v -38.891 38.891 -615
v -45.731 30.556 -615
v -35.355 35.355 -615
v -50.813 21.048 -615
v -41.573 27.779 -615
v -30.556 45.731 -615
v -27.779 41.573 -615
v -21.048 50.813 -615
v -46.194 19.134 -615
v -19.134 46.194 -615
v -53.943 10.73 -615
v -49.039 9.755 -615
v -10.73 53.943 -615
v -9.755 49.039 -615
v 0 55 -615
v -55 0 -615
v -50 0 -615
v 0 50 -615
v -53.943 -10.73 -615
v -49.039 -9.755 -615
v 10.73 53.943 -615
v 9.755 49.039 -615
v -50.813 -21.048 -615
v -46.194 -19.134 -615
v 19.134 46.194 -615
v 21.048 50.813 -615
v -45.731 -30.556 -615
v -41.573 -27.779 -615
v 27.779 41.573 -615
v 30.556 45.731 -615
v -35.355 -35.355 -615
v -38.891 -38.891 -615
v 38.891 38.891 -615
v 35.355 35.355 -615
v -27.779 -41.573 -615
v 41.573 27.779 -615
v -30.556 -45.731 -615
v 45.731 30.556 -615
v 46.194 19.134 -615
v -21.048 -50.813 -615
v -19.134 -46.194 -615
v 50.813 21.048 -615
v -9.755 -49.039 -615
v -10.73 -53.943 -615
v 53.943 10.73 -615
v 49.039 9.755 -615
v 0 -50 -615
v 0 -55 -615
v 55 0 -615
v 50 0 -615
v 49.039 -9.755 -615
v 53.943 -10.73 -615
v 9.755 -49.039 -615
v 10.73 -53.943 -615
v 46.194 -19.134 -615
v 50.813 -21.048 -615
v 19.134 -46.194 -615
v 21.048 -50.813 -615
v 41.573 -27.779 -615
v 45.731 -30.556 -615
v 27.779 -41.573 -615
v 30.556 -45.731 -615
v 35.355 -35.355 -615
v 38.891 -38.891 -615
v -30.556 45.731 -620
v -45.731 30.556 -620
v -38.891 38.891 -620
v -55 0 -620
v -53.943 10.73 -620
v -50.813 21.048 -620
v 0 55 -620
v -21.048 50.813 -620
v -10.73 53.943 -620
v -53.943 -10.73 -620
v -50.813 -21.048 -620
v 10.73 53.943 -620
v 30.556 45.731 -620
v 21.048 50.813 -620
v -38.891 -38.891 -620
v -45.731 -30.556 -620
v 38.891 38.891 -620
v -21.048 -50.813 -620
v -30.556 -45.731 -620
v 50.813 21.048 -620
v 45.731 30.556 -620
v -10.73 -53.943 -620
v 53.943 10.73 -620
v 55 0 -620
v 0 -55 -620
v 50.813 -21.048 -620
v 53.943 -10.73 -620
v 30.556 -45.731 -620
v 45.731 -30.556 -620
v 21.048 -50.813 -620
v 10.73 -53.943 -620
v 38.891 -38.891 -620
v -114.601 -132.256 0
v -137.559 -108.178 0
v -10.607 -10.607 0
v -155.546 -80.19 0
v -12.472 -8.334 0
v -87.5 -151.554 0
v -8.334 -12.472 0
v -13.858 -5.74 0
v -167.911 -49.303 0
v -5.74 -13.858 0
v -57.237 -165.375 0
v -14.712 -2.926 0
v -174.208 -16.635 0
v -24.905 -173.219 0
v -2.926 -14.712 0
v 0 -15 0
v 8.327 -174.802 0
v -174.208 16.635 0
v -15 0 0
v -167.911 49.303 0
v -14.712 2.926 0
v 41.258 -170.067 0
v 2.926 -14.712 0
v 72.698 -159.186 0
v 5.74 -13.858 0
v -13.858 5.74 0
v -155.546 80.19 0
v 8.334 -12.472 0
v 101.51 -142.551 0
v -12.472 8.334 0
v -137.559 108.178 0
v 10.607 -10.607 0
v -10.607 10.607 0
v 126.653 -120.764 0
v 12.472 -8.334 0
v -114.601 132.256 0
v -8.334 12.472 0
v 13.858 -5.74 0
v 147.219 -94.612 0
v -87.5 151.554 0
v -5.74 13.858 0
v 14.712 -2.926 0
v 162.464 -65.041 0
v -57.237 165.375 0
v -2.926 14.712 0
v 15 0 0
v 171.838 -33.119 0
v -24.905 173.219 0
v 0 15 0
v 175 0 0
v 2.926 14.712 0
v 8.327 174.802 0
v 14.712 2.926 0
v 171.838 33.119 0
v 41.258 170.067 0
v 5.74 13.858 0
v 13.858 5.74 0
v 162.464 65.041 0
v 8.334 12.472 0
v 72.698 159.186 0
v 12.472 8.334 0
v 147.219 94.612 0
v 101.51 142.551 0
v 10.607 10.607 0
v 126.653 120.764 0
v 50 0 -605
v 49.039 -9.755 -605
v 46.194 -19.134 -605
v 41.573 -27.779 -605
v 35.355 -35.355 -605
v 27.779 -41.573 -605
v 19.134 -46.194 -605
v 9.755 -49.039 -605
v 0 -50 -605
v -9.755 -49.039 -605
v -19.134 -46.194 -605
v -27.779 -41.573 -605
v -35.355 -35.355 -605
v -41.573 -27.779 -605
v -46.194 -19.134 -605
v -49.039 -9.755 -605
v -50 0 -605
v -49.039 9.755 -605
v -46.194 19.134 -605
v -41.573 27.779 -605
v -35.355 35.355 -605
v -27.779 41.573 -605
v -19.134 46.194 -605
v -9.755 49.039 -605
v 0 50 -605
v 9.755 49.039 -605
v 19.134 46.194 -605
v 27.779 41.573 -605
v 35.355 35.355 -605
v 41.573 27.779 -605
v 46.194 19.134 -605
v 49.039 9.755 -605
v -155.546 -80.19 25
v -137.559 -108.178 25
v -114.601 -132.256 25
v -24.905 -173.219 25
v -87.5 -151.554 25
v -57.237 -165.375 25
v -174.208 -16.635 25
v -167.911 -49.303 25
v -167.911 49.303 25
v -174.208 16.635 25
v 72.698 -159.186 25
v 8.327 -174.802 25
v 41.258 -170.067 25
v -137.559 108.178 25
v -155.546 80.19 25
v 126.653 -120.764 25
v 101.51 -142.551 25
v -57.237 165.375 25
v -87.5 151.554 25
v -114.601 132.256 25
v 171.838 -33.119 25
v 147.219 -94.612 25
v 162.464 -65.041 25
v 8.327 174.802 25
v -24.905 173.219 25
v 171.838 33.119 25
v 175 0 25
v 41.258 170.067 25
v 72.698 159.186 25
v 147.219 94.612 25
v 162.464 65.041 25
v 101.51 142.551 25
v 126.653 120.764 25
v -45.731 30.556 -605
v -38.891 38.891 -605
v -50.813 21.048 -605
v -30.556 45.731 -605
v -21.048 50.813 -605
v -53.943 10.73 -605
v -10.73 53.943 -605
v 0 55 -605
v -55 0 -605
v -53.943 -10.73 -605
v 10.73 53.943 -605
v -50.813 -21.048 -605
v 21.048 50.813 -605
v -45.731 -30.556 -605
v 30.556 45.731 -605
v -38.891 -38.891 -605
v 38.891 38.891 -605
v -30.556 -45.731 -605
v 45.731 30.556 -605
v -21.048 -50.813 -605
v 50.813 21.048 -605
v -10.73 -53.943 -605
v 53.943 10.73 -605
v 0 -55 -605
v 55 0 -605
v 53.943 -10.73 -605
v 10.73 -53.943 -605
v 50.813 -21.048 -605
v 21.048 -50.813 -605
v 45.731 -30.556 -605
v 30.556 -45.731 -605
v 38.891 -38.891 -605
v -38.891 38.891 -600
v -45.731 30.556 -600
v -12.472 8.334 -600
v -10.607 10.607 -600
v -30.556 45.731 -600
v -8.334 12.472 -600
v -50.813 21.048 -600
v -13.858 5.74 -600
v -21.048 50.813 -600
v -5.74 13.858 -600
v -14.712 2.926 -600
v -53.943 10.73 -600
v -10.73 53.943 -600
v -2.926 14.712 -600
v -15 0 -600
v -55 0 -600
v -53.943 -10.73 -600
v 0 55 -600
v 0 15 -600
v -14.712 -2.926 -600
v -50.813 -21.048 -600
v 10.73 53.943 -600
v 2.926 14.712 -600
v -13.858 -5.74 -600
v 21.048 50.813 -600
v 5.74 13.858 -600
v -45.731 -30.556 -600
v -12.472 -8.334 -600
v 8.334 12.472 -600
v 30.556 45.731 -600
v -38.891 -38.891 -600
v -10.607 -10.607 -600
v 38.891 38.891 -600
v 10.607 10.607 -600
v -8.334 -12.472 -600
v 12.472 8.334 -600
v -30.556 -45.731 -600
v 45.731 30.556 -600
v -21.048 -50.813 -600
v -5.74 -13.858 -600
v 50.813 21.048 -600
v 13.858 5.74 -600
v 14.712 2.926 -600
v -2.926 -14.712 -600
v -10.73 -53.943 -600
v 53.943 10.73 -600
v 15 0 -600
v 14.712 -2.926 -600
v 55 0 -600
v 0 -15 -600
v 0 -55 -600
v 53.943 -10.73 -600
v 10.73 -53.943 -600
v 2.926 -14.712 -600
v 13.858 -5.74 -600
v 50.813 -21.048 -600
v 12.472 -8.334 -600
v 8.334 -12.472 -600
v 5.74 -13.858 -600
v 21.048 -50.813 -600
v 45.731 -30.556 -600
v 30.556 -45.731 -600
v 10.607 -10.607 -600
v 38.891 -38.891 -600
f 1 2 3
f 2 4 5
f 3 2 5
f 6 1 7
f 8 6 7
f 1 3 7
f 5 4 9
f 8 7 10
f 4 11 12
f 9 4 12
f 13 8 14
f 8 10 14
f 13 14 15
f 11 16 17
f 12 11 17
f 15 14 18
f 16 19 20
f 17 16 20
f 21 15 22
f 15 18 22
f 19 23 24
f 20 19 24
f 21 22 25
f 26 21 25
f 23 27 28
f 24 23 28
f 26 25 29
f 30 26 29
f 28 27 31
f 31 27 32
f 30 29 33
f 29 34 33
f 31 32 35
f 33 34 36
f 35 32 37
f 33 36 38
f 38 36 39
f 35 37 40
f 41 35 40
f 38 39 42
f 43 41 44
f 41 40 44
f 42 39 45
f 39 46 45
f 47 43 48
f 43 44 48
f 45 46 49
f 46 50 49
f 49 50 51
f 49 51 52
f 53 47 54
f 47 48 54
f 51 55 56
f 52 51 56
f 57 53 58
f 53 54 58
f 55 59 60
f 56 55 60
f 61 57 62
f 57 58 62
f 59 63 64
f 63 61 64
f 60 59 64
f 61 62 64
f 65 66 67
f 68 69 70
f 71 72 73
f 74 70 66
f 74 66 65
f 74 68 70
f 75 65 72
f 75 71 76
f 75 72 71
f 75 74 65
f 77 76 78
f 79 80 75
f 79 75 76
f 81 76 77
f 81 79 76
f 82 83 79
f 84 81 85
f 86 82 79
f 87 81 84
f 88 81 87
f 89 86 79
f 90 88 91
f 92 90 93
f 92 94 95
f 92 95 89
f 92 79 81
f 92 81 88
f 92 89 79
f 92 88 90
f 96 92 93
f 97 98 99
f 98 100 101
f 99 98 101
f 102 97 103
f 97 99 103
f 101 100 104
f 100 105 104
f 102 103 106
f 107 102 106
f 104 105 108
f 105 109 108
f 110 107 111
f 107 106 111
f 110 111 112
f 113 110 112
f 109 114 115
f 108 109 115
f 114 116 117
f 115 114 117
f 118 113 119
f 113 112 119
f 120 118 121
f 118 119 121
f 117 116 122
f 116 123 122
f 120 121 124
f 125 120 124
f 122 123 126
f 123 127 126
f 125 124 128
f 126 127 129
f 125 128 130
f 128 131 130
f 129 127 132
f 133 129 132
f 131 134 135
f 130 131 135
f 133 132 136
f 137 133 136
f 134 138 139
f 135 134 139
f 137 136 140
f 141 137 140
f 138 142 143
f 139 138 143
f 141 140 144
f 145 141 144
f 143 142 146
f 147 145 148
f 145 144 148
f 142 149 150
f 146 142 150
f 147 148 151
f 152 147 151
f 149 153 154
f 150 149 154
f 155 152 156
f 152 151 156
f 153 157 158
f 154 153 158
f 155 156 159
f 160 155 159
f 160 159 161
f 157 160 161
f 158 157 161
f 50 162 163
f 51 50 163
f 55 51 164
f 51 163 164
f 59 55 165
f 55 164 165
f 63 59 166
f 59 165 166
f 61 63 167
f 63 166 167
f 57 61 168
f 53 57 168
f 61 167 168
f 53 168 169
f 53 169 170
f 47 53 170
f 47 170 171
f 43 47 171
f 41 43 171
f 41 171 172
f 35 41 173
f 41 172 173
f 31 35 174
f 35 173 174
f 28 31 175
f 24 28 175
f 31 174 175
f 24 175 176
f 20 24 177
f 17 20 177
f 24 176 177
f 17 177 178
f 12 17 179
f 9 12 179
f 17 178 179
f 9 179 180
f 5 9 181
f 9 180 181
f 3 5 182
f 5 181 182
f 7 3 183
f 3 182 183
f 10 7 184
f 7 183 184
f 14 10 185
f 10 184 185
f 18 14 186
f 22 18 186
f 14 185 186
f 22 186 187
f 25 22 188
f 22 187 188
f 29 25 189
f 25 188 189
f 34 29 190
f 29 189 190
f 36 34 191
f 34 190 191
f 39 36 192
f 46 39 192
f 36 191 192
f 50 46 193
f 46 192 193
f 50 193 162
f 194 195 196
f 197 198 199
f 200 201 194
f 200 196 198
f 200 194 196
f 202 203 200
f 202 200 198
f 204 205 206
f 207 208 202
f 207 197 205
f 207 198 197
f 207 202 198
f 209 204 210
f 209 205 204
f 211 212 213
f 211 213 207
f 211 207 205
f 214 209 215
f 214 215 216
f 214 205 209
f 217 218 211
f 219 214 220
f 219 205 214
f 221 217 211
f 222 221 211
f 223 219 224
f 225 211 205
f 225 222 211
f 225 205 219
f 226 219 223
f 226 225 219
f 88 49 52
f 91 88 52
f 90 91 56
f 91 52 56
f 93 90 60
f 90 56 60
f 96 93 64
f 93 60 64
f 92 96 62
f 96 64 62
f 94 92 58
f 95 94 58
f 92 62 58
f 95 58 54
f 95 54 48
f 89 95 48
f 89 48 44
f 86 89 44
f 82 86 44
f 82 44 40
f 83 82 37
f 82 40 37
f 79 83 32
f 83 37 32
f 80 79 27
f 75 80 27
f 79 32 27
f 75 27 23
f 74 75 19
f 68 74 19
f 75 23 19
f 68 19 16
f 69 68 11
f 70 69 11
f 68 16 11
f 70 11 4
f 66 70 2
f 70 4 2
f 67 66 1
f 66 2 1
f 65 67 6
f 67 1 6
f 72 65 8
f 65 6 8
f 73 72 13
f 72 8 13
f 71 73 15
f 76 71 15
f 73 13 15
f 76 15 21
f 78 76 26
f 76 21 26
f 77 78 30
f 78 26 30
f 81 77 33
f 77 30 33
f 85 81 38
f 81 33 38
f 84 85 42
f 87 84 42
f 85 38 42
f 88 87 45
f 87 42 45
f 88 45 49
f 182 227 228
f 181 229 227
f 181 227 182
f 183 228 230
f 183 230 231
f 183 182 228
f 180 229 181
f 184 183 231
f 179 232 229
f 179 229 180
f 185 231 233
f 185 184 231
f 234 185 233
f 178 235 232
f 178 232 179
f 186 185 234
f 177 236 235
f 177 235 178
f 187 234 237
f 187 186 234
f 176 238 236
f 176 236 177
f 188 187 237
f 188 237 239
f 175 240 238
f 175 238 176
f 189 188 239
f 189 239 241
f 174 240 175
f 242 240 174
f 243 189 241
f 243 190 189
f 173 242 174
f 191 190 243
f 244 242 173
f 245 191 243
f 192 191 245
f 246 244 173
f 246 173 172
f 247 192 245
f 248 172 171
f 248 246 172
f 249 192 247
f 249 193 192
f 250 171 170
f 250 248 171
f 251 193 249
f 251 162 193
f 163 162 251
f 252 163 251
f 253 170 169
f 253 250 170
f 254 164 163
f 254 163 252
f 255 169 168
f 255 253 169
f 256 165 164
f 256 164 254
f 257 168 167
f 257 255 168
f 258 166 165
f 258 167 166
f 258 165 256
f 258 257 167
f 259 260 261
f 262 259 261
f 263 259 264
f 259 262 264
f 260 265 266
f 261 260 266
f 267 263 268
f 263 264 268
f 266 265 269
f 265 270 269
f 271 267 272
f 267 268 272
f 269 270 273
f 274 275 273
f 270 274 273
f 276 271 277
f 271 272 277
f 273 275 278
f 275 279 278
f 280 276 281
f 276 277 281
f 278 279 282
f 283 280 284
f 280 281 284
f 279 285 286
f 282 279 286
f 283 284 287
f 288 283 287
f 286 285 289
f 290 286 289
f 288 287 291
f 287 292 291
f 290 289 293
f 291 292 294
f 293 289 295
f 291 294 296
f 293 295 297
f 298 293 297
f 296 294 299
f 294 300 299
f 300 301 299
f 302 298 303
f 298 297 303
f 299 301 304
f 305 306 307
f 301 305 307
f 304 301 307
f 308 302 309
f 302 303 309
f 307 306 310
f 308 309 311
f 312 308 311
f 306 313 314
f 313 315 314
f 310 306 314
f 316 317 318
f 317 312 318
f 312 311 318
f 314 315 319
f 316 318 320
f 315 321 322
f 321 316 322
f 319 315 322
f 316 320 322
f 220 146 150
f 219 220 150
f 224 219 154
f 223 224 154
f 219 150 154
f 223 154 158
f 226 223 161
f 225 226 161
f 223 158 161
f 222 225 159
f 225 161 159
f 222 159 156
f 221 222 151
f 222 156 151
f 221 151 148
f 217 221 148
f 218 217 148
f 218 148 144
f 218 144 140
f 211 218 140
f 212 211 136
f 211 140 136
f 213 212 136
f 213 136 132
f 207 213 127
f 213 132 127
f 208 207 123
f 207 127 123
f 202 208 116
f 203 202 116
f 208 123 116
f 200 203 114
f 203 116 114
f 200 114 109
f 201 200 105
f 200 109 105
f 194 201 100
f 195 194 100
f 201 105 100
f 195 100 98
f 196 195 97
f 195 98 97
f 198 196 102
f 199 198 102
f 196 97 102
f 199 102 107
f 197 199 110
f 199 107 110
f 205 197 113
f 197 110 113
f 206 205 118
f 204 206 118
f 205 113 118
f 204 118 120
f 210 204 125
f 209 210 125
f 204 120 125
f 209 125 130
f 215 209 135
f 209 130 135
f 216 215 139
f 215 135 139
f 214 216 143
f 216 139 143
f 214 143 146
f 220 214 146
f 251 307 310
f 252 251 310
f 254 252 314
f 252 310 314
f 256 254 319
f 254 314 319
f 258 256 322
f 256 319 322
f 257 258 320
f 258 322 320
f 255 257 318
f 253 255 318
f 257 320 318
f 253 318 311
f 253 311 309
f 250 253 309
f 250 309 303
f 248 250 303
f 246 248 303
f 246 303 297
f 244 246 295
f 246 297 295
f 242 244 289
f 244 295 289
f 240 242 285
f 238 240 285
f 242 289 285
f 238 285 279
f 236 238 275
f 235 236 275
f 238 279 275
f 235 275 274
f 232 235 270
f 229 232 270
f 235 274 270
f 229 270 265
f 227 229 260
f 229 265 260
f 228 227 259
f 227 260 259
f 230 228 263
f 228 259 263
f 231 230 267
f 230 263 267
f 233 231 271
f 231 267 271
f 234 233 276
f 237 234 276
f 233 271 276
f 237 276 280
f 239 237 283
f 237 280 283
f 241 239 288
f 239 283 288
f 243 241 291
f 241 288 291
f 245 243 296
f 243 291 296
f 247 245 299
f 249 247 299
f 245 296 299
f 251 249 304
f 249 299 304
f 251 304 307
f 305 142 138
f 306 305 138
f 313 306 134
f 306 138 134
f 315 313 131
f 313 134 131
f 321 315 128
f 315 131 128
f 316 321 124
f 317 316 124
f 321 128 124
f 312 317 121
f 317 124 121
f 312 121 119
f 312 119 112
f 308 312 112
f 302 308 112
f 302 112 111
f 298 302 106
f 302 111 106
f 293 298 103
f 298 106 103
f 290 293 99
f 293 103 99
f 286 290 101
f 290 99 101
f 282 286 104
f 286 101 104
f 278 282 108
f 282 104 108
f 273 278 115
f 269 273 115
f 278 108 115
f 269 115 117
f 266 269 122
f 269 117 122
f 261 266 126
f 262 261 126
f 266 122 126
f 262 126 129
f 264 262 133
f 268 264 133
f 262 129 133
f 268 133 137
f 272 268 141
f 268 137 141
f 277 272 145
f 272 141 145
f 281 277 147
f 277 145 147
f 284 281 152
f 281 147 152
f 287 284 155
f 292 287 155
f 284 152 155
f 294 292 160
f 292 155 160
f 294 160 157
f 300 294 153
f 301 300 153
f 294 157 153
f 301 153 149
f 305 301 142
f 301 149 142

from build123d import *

# Parameters (mm, degrees)
F0_R     = 175
F1_DEPTH = 25
F2_R     = 15
F3_DEPTH = 600
F4_R     = 55
F4_R_2   = 15
F5_DEPTH = 5
F6_R     = 50
F7_DEPTH = 10
F8_R     = 55
F8_R_2   = 50
F9_DEPTH = 5


with BuildPart() as f1:
    # F0 (on Top) → F1 (new body)
    with BuildSketch(Plane.XY):
        Circle(F0_R)
    extrude(amount=F1_DEPTH)

    # F2 (on face) → F3 (join)
    with BuildSketch(Plane(origin=(0, 0, 0), x_dir=(1, 0, 0), z_dir=(0, 0, -1))):
        Circle(F2_R)
    extrude(amount=F3_DEPTH)

    # F4 (on face) → F5 (join)
    with BuildSketch(Plane(origin=(0, 0, -600), x_dir=(1, 0, 0), z_dir=(0, 0, -1))):
        Circle(F4_R)
        Circle(F4_R_2, mode=Mode.SUBTRACT)
        Circle(F4_R_2)
    extrude(amount=F5_DEPTH)

    # F6 (on face) → F7 (join)
    with BuildSketch(Plane(origin=(0, 0, -605), x_dir=(1, 0, 0), z_dir=(0, 0, -1))):
        Circle(F6_R)
    extrude(amount=F7_DEPTH)

    # F8 (on face) → F9 (join)
    with BuildSketch(Plane(origin=(0, 0, -615), x_dir=(1, 0, 0), z_dir=(0, 0, -1))):
        Circle(F8_R)
        Circle(F8_R_2, mode=Mode.SUBTRACT)
        Circle(F8_R_2)
    extrude(amount=F9_DEPTH)


solid = f1.part
